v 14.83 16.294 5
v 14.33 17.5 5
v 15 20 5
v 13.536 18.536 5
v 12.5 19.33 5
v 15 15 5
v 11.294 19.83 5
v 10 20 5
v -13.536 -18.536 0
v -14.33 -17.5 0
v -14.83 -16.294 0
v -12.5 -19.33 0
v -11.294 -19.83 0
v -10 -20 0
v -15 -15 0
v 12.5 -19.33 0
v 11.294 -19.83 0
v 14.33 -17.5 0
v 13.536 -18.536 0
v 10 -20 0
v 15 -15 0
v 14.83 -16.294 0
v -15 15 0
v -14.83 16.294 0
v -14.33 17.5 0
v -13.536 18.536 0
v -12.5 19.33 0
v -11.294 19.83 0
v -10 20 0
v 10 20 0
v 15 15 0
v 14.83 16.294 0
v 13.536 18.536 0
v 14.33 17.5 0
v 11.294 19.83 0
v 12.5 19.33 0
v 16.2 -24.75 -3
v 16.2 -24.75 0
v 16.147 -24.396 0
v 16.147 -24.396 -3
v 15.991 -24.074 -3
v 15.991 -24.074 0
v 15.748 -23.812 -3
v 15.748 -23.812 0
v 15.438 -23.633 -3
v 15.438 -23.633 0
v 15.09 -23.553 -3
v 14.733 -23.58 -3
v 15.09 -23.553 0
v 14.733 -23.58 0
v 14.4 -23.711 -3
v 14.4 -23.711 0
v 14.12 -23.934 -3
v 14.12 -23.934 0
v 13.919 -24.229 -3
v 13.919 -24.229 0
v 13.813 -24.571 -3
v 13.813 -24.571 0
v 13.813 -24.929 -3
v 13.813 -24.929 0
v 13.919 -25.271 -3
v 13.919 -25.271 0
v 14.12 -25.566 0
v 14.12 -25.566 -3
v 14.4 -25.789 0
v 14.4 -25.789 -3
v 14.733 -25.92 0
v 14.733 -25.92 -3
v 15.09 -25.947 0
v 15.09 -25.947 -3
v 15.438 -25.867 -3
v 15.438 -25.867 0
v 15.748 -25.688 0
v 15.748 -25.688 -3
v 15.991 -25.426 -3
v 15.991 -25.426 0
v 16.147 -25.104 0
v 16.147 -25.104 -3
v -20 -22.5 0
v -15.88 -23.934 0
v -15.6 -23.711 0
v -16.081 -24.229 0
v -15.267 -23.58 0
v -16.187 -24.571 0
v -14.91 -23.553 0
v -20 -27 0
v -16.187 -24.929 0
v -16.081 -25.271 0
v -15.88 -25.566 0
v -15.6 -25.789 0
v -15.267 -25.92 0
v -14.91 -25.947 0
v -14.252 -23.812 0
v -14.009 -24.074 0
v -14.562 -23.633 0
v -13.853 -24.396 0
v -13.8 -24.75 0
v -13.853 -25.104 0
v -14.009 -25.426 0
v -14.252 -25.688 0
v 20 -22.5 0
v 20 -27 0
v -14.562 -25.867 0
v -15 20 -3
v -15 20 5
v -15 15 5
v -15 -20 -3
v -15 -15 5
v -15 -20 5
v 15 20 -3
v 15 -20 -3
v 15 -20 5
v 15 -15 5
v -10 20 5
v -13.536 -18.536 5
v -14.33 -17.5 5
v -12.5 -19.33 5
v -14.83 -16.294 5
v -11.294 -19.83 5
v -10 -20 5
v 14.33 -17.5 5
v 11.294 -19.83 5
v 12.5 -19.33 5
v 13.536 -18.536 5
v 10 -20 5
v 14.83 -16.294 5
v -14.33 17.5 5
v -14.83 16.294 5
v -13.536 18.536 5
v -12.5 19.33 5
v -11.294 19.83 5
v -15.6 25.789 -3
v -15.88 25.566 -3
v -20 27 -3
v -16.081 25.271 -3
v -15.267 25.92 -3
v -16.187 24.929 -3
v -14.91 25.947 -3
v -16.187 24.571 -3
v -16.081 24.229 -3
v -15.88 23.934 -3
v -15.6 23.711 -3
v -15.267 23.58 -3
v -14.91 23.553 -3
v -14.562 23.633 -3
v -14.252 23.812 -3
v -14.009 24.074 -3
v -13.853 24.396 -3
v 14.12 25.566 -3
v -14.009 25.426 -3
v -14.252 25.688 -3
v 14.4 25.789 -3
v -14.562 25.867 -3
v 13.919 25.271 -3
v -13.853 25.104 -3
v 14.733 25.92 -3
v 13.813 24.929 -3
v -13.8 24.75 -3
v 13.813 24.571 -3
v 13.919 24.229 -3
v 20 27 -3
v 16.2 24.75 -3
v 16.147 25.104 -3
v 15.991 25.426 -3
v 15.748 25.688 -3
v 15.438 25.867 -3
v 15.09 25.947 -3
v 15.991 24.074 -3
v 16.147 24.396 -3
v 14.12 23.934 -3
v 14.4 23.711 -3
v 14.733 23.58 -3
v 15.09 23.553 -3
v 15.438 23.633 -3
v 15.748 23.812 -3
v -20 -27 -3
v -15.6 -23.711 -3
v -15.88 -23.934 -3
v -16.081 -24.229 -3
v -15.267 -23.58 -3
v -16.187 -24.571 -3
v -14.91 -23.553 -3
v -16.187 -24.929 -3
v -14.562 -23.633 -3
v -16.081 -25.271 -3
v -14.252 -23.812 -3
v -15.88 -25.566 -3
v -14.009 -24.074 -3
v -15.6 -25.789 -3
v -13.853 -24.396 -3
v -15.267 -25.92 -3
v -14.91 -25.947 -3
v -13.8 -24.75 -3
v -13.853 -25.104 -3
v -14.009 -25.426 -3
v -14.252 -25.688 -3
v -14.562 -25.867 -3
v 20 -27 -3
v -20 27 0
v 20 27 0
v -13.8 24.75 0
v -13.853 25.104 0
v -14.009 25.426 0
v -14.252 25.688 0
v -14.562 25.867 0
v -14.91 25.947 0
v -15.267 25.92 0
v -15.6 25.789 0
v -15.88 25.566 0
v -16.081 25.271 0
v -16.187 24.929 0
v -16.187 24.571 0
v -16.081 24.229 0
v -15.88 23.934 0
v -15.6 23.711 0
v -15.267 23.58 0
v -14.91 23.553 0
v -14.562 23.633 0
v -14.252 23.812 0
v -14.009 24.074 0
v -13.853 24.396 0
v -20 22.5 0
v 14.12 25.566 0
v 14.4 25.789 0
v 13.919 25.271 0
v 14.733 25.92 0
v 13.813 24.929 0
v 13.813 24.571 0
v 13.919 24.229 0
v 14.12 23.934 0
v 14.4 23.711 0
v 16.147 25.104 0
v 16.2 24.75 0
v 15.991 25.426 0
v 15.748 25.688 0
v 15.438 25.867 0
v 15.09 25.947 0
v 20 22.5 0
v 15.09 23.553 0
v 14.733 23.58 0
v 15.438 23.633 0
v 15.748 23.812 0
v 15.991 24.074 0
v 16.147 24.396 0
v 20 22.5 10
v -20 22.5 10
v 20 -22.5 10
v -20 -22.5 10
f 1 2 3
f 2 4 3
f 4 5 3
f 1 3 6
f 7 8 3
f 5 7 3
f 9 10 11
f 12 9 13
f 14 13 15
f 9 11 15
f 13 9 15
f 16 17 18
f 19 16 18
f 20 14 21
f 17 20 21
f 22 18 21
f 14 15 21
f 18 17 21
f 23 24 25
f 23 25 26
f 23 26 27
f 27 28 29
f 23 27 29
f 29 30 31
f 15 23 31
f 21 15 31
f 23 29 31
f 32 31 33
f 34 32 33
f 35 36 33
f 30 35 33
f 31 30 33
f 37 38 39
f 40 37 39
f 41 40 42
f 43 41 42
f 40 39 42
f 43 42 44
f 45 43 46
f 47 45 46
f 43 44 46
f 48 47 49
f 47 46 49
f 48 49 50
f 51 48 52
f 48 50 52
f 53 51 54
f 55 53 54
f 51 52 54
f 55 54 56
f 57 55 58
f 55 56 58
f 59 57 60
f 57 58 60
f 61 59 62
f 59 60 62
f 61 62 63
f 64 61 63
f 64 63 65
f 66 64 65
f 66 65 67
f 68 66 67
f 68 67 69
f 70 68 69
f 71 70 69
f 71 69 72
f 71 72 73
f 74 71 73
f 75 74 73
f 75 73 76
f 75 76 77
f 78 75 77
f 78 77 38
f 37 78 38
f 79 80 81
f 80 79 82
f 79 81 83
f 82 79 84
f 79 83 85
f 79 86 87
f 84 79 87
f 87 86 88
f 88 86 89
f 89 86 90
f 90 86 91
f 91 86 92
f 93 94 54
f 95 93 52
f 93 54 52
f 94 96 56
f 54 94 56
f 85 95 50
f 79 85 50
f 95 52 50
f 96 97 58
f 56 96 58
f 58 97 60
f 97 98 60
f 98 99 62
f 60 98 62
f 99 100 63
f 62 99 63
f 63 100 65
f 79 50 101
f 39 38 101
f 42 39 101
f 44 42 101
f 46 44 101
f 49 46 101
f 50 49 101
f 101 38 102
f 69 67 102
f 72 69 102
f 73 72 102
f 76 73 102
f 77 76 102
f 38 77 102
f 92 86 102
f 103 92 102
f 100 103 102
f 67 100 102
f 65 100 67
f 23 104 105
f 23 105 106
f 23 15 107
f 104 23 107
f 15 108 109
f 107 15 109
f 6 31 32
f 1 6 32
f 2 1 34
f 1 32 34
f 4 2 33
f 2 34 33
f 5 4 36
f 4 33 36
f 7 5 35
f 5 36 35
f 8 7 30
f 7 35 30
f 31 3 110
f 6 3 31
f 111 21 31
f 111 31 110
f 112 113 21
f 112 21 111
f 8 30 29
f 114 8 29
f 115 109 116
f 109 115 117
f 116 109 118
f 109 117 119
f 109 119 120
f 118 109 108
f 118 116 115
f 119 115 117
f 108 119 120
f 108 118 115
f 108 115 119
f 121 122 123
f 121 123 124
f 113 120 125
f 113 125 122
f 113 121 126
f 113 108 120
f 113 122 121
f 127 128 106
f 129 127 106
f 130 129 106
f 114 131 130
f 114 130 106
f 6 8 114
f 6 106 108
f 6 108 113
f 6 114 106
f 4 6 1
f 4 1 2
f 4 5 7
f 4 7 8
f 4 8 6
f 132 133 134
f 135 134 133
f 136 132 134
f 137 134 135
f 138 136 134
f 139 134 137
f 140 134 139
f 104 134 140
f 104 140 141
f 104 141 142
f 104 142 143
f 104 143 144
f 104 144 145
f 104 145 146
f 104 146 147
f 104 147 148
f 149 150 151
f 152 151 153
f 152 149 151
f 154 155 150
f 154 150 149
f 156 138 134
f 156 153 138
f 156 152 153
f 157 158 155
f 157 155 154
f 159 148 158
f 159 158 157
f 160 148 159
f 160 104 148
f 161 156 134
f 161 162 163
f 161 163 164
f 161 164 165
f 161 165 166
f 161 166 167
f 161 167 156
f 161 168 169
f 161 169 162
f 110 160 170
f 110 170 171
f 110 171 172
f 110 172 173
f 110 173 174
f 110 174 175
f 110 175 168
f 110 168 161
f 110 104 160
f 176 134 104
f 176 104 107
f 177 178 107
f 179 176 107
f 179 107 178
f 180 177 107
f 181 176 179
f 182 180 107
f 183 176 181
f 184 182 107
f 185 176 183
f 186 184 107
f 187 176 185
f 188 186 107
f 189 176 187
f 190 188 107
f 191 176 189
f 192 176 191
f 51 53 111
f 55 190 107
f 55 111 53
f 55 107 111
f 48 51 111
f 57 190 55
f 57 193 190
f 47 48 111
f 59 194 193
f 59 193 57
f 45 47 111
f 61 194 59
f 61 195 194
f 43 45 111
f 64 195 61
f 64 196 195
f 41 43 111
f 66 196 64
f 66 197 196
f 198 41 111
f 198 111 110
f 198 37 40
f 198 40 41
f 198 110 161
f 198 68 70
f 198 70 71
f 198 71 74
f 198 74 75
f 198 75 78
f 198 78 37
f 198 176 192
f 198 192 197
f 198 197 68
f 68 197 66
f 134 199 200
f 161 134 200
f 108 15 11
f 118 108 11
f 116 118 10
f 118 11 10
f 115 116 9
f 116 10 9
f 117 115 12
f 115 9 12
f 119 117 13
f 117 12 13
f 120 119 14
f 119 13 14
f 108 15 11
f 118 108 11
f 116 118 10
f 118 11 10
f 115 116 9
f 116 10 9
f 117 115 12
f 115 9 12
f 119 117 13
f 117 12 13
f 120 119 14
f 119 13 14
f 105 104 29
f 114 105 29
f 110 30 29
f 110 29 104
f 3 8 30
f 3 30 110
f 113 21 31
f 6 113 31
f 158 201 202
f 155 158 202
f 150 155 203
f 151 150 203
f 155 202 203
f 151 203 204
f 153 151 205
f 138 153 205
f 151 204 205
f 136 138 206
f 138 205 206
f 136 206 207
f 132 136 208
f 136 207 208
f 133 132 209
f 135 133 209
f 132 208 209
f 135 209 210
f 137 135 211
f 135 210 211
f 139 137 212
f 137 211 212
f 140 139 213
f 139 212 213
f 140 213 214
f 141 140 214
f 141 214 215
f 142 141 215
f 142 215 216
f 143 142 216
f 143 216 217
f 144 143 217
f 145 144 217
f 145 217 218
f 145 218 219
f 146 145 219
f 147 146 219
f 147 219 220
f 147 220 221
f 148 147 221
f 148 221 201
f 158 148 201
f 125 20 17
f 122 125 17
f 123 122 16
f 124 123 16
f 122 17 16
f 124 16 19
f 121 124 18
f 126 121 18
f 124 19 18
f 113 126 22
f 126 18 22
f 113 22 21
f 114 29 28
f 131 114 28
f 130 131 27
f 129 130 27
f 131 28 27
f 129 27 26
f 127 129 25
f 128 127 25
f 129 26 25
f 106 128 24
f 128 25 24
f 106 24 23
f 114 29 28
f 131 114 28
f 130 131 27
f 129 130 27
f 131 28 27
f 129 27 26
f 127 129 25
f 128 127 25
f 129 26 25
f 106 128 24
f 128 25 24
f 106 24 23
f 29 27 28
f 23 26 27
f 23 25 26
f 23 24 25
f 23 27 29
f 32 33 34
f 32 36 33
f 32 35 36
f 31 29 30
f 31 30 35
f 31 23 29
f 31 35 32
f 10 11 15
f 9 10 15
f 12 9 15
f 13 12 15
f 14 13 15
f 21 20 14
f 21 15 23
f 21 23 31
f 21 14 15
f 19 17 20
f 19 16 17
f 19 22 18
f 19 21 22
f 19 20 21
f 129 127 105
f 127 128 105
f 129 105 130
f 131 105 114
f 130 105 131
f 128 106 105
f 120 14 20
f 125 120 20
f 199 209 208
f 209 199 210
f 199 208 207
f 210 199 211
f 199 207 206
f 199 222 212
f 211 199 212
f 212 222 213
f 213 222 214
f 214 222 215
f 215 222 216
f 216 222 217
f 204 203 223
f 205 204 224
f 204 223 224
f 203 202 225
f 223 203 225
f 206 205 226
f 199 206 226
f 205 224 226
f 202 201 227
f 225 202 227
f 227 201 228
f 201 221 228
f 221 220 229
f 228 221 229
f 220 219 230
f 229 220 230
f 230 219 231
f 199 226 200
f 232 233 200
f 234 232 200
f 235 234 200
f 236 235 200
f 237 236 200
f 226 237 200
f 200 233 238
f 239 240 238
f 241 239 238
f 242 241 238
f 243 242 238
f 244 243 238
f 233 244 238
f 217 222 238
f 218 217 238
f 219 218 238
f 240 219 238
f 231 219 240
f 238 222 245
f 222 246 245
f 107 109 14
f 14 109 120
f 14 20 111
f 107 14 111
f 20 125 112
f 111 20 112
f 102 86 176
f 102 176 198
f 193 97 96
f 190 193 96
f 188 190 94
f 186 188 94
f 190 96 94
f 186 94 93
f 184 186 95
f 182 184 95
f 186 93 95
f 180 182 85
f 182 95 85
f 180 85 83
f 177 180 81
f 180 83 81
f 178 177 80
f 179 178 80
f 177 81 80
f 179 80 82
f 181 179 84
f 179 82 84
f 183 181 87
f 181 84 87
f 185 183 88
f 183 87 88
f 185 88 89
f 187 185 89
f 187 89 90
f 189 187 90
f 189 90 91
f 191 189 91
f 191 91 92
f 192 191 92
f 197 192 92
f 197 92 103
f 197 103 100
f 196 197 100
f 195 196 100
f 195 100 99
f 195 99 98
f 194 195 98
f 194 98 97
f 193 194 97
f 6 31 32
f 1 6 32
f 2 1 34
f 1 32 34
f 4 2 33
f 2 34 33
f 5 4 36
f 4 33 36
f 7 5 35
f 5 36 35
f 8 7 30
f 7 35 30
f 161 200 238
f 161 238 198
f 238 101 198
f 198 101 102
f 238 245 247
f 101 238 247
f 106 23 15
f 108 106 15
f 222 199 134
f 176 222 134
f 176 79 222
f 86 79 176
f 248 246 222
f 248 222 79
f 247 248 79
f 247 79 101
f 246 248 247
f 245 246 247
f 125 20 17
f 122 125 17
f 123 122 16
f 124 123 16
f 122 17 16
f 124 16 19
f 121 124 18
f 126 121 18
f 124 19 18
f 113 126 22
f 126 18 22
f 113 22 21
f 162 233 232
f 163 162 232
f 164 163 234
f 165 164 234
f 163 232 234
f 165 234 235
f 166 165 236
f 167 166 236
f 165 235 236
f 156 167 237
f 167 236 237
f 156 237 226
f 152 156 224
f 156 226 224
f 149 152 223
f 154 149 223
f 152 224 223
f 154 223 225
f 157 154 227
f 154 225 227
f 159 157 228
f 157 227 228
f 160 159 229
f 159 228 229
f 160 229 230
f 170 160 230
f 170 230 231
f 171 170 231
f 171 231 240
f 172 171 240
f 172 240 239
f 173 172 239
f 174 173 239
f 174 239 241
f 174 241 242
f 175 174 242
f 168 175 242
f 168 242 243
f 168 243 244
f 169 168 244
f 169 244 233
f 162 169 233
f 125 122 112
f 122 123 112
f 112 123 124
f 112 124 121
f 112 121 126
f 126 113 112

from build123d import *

# Parameters (mm, degrees)
PAD_DEPTH     = 5
PAD004_DEPTH  = 5
SKETCH007_W   = 40
SKETCH007_H   = 45
PAD005_DEPTH  = 5
SKETCH008_W   = 40
SKETCH008_H   = 45
SKETCH008_W_2 = 30
SKETCH008_H_2 = 40
PAD006_DEPTH  = 5
SKETCH009_W   = 40
SKETCH009_H   = 54
SKETCH009_W_2 = 30
SKETCH009_H_2 = 40
PAD007_DEPTH  = 3
SKETCH010_R   = 1.2
HOLE001_DEPTH = 25


with BuildPart() as cuerpo:
    # Sketch → Pad (new body)
    with BuildSketch(Plane.XY):
        with BuildLine():
            Line((15, -15), (15, 15))
            ThreePointArc((15, 15), (13.535534, 18.535534), (10, 20))
            Line((10, 20), (-10, 20))
            ThreePointArc((-10, 20), (-13.535534, 18.535534), (-15, 15))
            Line((-15, 15), (-15, -15))
            ThreePointArc((-15, -15), (-13.535534, -18.535534), (-10, -20))
            Line((-10, -20), (10, -20))
            ThreePointArc((10, -20), (13.535534, -18.535534), (15, -15))
        make_face()
    extrude(amount=PAD_DEPTH)


with BuildPart() as cuerpo002:
    # Sketch006 → Pad004 (new body)
    with BuildSketch(Plane.XY):
        with BuildLine():
            Line((15, -15), (15, 15))
            ThreePointArc((15, 15), (13.535534, 18.535534), (10, 20))
            Line((10, 20), (-10, 20))
            ThreePointArc((-10, 20), (-13.535534, 18.535534), (-15, 15))
            Line((-15, 15), (-15, -15))
            ThreePointArc((-15, -15), (-13.535534, -18.535534), (-10, -20))
            Line((-10, -20), (10, -20))
            ThreePointArc((10, -20), (13.535534, -18.535534), (15, -15))
        make_face()
    extrude(amount=PAD004_DEPTH)

    # Sketch007 (on Face10 of Pad004) → Pad005 (join)
    with BuildSketch(Plane.XY.offset(5)):
        Rectangle(SKETCH007_W, SKETCH007_H)
    extrude(amount=PAD005_DEPTH)

    # Sketch008 (on Face4 of Pad005) → Pad006 (join)
    with BuildSketch(Plane(origin=(0, 0, 5), x_dir=(1, 0, 0), z_dir=(0, 0, -1))):
        Rectangle(SKETCH008_W, SKETCH008_H)
        Rectangle(SKETCH008_W_2, SKETCH008_H_2, mode=Mode.SUBTRACT)
    extrude(amount=PAD006_DEPTH)

    # Sketch009 (on Face9 of Pad006) → Pad007 (join)
    with BuildSketch(Plane(origin=(0, 0, 0), x_dir=(1, 0, 0), z_dir=(0, 0, -1))):
        Rectangle(SKETCH009_W, SKETCH009_H)
        Rectangle(SKETCH009_W_2, SKETCH009_H_2, mode=Mode.SUBTRACT)
    extrude(amount=PAD007_DEPTH)

    # Sketch010 (on Face11 of Pad007) → Hole001 (cut)
    with BuildSketch(Plane.XY):
        with Locations((-15, -24.75)):
            Circle(SKETCH010_R)
        with Locations((15, -24.75)):
            Circle(SKETCH010_R)
        with Locations((15, 24.75)):
            Circle(SKETCH010_R)
        with Locations((-15, 24.75)):
            Circle(SKETCH010_R)
    extrude(amount=-HOLE001_DEPTH, mode=Mode.SUBTRACT)


solid = Compound([cuerpo.part, cuerpo002.part])
